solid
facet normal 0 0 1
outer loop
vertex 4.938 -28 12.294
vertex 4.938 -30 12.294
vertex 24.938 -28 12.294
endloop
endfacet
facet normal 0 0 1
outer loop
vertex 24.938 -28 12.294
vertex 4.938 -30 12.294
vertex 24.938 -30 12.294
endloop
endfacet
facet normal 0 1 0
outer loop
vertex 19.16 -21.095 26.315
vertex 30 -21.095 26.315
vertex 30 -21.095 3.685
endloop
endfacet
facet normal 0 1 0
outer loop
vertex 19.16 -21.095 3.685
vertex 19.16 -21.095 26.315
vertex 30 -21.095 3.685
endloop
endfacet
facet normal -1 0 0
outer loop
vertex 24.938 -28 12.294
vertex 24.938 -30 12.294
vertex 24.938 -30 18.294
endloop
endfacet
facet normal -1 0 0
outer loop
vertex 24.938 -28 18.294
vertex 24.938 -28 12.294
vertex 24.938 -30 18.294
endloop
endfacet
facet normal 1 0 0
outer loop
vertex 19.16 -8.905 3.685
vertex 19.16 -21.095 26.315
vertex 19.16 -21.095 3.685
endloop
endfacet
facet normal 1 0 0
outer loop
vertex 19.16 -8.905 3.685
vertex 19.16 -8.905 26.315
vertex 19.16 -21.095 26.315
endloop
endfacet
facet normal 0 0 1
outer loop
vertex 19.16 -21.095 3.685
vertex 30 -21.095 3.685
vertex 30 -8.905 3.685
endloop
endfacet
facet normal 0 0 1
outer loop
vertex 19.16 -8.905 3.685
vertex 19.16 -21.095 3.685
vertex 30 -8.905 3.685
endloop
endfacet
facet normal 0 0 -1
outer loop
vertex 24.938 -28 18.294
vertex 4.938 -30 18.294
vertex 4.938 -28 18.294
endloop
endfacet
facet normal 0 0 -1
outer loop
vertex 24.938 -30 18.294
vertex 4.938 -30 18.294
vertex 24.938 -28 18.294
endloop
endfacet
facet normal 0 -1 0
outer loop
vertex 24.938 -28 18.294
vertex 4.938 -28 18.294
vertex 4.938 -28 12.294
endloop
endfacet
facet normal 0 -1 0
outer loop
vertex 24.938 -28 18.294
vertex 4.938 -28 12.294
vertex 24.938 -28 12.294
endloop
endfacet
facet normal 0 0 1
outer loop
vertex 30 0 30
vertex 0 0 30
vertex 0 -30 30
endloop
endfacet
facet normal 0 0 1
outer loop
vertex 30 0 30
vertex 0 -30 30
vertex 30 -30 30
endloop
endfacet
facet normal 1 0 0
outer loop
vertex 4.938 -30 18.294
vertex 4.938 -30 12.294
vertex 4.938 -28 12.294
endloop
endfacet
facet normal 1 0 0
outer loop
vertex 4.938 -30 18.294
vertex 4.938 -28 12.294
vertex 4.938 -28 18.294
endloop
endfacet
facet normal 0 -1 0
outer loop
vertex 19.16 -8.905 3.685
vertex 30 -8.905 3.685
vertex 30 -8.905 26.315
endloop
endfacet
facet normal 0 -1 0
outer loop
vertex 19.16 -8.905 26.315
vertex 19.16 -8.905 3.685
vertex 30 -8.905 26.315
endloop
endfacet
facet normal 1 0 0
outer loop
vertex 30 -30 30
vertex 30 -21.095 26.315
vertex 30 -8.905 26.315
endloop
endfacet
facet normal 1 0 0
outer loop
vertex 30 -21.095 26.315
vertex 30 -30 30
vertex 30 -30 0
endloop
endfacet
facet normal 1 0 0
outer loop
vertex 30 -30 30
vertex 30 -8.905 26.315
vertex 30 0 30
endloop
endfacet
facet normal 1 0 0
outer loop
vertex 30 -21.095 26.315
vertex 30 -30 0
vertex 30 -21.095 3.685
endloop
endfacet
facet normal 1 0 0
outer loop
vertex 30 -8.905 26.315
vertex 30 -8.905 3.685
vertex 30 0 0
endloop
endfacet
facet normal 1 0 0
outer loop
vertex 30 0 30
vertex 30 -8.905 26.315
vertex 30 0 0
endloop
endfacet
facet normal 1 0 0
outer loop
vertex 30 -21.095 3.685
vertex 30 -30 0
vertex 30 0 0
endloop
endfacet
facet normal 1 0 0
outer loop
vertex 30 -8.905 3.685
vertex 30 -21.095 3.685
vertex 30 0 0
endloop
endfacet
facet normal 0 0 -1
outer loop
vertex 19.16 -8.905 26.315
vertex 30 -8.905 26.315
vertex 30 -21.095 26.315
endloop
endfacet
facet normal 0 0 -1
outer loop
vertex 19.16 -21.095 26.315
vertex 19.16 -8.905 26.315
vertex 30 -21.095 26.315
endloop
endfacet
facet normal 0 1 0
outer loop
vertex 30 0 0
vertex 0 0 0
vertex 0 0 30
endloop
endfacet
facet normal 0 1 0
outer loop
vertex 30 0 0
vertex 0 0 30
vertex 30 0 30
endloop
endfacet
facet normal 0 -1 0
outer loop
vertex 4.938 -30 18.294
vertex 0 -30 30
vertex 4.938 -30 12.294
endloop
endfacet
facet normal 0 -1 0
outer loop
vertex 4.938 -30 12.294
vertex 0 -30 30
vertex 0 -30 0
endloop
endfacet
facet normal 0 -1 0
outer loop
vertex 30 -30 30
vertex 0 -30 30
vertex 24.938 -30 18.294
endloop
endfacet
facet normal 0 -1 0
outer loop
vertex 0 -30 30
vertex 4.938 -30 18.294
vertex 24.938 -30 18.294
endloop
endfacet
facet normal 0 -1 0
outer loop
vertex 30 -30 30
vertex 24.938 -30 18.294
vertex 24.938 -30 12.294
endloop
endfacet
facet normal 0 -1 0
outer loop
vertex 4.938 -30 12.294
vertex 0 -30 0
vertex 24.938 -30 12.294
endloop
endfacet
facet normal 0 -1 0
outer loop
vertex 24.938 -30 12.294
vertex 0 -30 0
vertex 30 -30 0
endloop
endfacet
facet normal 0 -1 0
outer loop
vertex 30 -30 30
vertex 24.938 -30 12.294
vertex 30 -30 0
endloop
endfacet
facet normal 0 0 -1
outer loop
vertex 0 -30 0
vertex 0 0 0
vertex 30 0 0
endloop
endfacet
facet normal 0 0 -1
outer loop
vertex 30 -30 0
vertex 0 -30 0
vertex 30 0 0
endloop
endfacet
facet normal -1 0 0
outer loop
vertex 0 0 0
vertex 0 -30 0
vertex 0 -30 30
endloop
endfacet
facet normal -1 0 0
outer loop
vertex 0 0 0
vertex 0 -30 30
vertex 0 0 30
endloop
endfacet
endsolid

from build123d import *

# Parameters (mm, degrees)
SKETCH1_W           = 30
SKETCH1_H           = 30
BOSS_EXTRUDE1_DEPTH = 30
SKETCH2_W           = 11.315
SKETCH2_H           = 6.095
CUT_EXTRUDE1_DEPTH  = 10.84
SKETCH3_W           = 20
SKETCH3_H           = 6
CUT_EXTRUDE4_DEPTH  = 2


with BuildPart() as part:
    # Sketch1 → Boss-Extrude1 (new body)
    with BuildSketch(Plane.XY):
        with Locations((15, -15)):
            Rectangle(SKETCH1_W, SKETCH1_H)
    extrude(amount=BOSS_EXTRUDE1_DEPTH)

    # Sketch2 → Cut-Extrude1 (cut)
    with BuildSketch(Plane(origin=(30, 0, 0), x_dir=(0, 0, -1), z_dir=(1, 0, 0))):
        with Locations((-20.6575, -18.0475)):
            Rectangle(SKETCH2_W, SKETCH2_H)
        Polygon((-3.685, -8.905), (-26.315, -8.905), (-26.315, -15), (-15, -15), (-3.685, -15), align=None)
        with Locations((-9.3425, -18.0475)):
            Rectangle(SKETCH2_W, SKETCH2_H)
    extrude(amount=-CUT_EXTRUDE1_DEPTH, mode=Mode.SUBTRACT)

    # Sketch3 → Cut-Extrude4 (cut)
    with BuildSketch(Plane.XZ.offset(30)):
        with Locations((14.938029793, 15.294097389)):
            Rectangle(SKETCH3_W, SKETCH3_H)
    extrude(amount=-CUT_EXTRUDE4_DEPTH, mode=Mode.SUBTRACT)


solid = part.part
